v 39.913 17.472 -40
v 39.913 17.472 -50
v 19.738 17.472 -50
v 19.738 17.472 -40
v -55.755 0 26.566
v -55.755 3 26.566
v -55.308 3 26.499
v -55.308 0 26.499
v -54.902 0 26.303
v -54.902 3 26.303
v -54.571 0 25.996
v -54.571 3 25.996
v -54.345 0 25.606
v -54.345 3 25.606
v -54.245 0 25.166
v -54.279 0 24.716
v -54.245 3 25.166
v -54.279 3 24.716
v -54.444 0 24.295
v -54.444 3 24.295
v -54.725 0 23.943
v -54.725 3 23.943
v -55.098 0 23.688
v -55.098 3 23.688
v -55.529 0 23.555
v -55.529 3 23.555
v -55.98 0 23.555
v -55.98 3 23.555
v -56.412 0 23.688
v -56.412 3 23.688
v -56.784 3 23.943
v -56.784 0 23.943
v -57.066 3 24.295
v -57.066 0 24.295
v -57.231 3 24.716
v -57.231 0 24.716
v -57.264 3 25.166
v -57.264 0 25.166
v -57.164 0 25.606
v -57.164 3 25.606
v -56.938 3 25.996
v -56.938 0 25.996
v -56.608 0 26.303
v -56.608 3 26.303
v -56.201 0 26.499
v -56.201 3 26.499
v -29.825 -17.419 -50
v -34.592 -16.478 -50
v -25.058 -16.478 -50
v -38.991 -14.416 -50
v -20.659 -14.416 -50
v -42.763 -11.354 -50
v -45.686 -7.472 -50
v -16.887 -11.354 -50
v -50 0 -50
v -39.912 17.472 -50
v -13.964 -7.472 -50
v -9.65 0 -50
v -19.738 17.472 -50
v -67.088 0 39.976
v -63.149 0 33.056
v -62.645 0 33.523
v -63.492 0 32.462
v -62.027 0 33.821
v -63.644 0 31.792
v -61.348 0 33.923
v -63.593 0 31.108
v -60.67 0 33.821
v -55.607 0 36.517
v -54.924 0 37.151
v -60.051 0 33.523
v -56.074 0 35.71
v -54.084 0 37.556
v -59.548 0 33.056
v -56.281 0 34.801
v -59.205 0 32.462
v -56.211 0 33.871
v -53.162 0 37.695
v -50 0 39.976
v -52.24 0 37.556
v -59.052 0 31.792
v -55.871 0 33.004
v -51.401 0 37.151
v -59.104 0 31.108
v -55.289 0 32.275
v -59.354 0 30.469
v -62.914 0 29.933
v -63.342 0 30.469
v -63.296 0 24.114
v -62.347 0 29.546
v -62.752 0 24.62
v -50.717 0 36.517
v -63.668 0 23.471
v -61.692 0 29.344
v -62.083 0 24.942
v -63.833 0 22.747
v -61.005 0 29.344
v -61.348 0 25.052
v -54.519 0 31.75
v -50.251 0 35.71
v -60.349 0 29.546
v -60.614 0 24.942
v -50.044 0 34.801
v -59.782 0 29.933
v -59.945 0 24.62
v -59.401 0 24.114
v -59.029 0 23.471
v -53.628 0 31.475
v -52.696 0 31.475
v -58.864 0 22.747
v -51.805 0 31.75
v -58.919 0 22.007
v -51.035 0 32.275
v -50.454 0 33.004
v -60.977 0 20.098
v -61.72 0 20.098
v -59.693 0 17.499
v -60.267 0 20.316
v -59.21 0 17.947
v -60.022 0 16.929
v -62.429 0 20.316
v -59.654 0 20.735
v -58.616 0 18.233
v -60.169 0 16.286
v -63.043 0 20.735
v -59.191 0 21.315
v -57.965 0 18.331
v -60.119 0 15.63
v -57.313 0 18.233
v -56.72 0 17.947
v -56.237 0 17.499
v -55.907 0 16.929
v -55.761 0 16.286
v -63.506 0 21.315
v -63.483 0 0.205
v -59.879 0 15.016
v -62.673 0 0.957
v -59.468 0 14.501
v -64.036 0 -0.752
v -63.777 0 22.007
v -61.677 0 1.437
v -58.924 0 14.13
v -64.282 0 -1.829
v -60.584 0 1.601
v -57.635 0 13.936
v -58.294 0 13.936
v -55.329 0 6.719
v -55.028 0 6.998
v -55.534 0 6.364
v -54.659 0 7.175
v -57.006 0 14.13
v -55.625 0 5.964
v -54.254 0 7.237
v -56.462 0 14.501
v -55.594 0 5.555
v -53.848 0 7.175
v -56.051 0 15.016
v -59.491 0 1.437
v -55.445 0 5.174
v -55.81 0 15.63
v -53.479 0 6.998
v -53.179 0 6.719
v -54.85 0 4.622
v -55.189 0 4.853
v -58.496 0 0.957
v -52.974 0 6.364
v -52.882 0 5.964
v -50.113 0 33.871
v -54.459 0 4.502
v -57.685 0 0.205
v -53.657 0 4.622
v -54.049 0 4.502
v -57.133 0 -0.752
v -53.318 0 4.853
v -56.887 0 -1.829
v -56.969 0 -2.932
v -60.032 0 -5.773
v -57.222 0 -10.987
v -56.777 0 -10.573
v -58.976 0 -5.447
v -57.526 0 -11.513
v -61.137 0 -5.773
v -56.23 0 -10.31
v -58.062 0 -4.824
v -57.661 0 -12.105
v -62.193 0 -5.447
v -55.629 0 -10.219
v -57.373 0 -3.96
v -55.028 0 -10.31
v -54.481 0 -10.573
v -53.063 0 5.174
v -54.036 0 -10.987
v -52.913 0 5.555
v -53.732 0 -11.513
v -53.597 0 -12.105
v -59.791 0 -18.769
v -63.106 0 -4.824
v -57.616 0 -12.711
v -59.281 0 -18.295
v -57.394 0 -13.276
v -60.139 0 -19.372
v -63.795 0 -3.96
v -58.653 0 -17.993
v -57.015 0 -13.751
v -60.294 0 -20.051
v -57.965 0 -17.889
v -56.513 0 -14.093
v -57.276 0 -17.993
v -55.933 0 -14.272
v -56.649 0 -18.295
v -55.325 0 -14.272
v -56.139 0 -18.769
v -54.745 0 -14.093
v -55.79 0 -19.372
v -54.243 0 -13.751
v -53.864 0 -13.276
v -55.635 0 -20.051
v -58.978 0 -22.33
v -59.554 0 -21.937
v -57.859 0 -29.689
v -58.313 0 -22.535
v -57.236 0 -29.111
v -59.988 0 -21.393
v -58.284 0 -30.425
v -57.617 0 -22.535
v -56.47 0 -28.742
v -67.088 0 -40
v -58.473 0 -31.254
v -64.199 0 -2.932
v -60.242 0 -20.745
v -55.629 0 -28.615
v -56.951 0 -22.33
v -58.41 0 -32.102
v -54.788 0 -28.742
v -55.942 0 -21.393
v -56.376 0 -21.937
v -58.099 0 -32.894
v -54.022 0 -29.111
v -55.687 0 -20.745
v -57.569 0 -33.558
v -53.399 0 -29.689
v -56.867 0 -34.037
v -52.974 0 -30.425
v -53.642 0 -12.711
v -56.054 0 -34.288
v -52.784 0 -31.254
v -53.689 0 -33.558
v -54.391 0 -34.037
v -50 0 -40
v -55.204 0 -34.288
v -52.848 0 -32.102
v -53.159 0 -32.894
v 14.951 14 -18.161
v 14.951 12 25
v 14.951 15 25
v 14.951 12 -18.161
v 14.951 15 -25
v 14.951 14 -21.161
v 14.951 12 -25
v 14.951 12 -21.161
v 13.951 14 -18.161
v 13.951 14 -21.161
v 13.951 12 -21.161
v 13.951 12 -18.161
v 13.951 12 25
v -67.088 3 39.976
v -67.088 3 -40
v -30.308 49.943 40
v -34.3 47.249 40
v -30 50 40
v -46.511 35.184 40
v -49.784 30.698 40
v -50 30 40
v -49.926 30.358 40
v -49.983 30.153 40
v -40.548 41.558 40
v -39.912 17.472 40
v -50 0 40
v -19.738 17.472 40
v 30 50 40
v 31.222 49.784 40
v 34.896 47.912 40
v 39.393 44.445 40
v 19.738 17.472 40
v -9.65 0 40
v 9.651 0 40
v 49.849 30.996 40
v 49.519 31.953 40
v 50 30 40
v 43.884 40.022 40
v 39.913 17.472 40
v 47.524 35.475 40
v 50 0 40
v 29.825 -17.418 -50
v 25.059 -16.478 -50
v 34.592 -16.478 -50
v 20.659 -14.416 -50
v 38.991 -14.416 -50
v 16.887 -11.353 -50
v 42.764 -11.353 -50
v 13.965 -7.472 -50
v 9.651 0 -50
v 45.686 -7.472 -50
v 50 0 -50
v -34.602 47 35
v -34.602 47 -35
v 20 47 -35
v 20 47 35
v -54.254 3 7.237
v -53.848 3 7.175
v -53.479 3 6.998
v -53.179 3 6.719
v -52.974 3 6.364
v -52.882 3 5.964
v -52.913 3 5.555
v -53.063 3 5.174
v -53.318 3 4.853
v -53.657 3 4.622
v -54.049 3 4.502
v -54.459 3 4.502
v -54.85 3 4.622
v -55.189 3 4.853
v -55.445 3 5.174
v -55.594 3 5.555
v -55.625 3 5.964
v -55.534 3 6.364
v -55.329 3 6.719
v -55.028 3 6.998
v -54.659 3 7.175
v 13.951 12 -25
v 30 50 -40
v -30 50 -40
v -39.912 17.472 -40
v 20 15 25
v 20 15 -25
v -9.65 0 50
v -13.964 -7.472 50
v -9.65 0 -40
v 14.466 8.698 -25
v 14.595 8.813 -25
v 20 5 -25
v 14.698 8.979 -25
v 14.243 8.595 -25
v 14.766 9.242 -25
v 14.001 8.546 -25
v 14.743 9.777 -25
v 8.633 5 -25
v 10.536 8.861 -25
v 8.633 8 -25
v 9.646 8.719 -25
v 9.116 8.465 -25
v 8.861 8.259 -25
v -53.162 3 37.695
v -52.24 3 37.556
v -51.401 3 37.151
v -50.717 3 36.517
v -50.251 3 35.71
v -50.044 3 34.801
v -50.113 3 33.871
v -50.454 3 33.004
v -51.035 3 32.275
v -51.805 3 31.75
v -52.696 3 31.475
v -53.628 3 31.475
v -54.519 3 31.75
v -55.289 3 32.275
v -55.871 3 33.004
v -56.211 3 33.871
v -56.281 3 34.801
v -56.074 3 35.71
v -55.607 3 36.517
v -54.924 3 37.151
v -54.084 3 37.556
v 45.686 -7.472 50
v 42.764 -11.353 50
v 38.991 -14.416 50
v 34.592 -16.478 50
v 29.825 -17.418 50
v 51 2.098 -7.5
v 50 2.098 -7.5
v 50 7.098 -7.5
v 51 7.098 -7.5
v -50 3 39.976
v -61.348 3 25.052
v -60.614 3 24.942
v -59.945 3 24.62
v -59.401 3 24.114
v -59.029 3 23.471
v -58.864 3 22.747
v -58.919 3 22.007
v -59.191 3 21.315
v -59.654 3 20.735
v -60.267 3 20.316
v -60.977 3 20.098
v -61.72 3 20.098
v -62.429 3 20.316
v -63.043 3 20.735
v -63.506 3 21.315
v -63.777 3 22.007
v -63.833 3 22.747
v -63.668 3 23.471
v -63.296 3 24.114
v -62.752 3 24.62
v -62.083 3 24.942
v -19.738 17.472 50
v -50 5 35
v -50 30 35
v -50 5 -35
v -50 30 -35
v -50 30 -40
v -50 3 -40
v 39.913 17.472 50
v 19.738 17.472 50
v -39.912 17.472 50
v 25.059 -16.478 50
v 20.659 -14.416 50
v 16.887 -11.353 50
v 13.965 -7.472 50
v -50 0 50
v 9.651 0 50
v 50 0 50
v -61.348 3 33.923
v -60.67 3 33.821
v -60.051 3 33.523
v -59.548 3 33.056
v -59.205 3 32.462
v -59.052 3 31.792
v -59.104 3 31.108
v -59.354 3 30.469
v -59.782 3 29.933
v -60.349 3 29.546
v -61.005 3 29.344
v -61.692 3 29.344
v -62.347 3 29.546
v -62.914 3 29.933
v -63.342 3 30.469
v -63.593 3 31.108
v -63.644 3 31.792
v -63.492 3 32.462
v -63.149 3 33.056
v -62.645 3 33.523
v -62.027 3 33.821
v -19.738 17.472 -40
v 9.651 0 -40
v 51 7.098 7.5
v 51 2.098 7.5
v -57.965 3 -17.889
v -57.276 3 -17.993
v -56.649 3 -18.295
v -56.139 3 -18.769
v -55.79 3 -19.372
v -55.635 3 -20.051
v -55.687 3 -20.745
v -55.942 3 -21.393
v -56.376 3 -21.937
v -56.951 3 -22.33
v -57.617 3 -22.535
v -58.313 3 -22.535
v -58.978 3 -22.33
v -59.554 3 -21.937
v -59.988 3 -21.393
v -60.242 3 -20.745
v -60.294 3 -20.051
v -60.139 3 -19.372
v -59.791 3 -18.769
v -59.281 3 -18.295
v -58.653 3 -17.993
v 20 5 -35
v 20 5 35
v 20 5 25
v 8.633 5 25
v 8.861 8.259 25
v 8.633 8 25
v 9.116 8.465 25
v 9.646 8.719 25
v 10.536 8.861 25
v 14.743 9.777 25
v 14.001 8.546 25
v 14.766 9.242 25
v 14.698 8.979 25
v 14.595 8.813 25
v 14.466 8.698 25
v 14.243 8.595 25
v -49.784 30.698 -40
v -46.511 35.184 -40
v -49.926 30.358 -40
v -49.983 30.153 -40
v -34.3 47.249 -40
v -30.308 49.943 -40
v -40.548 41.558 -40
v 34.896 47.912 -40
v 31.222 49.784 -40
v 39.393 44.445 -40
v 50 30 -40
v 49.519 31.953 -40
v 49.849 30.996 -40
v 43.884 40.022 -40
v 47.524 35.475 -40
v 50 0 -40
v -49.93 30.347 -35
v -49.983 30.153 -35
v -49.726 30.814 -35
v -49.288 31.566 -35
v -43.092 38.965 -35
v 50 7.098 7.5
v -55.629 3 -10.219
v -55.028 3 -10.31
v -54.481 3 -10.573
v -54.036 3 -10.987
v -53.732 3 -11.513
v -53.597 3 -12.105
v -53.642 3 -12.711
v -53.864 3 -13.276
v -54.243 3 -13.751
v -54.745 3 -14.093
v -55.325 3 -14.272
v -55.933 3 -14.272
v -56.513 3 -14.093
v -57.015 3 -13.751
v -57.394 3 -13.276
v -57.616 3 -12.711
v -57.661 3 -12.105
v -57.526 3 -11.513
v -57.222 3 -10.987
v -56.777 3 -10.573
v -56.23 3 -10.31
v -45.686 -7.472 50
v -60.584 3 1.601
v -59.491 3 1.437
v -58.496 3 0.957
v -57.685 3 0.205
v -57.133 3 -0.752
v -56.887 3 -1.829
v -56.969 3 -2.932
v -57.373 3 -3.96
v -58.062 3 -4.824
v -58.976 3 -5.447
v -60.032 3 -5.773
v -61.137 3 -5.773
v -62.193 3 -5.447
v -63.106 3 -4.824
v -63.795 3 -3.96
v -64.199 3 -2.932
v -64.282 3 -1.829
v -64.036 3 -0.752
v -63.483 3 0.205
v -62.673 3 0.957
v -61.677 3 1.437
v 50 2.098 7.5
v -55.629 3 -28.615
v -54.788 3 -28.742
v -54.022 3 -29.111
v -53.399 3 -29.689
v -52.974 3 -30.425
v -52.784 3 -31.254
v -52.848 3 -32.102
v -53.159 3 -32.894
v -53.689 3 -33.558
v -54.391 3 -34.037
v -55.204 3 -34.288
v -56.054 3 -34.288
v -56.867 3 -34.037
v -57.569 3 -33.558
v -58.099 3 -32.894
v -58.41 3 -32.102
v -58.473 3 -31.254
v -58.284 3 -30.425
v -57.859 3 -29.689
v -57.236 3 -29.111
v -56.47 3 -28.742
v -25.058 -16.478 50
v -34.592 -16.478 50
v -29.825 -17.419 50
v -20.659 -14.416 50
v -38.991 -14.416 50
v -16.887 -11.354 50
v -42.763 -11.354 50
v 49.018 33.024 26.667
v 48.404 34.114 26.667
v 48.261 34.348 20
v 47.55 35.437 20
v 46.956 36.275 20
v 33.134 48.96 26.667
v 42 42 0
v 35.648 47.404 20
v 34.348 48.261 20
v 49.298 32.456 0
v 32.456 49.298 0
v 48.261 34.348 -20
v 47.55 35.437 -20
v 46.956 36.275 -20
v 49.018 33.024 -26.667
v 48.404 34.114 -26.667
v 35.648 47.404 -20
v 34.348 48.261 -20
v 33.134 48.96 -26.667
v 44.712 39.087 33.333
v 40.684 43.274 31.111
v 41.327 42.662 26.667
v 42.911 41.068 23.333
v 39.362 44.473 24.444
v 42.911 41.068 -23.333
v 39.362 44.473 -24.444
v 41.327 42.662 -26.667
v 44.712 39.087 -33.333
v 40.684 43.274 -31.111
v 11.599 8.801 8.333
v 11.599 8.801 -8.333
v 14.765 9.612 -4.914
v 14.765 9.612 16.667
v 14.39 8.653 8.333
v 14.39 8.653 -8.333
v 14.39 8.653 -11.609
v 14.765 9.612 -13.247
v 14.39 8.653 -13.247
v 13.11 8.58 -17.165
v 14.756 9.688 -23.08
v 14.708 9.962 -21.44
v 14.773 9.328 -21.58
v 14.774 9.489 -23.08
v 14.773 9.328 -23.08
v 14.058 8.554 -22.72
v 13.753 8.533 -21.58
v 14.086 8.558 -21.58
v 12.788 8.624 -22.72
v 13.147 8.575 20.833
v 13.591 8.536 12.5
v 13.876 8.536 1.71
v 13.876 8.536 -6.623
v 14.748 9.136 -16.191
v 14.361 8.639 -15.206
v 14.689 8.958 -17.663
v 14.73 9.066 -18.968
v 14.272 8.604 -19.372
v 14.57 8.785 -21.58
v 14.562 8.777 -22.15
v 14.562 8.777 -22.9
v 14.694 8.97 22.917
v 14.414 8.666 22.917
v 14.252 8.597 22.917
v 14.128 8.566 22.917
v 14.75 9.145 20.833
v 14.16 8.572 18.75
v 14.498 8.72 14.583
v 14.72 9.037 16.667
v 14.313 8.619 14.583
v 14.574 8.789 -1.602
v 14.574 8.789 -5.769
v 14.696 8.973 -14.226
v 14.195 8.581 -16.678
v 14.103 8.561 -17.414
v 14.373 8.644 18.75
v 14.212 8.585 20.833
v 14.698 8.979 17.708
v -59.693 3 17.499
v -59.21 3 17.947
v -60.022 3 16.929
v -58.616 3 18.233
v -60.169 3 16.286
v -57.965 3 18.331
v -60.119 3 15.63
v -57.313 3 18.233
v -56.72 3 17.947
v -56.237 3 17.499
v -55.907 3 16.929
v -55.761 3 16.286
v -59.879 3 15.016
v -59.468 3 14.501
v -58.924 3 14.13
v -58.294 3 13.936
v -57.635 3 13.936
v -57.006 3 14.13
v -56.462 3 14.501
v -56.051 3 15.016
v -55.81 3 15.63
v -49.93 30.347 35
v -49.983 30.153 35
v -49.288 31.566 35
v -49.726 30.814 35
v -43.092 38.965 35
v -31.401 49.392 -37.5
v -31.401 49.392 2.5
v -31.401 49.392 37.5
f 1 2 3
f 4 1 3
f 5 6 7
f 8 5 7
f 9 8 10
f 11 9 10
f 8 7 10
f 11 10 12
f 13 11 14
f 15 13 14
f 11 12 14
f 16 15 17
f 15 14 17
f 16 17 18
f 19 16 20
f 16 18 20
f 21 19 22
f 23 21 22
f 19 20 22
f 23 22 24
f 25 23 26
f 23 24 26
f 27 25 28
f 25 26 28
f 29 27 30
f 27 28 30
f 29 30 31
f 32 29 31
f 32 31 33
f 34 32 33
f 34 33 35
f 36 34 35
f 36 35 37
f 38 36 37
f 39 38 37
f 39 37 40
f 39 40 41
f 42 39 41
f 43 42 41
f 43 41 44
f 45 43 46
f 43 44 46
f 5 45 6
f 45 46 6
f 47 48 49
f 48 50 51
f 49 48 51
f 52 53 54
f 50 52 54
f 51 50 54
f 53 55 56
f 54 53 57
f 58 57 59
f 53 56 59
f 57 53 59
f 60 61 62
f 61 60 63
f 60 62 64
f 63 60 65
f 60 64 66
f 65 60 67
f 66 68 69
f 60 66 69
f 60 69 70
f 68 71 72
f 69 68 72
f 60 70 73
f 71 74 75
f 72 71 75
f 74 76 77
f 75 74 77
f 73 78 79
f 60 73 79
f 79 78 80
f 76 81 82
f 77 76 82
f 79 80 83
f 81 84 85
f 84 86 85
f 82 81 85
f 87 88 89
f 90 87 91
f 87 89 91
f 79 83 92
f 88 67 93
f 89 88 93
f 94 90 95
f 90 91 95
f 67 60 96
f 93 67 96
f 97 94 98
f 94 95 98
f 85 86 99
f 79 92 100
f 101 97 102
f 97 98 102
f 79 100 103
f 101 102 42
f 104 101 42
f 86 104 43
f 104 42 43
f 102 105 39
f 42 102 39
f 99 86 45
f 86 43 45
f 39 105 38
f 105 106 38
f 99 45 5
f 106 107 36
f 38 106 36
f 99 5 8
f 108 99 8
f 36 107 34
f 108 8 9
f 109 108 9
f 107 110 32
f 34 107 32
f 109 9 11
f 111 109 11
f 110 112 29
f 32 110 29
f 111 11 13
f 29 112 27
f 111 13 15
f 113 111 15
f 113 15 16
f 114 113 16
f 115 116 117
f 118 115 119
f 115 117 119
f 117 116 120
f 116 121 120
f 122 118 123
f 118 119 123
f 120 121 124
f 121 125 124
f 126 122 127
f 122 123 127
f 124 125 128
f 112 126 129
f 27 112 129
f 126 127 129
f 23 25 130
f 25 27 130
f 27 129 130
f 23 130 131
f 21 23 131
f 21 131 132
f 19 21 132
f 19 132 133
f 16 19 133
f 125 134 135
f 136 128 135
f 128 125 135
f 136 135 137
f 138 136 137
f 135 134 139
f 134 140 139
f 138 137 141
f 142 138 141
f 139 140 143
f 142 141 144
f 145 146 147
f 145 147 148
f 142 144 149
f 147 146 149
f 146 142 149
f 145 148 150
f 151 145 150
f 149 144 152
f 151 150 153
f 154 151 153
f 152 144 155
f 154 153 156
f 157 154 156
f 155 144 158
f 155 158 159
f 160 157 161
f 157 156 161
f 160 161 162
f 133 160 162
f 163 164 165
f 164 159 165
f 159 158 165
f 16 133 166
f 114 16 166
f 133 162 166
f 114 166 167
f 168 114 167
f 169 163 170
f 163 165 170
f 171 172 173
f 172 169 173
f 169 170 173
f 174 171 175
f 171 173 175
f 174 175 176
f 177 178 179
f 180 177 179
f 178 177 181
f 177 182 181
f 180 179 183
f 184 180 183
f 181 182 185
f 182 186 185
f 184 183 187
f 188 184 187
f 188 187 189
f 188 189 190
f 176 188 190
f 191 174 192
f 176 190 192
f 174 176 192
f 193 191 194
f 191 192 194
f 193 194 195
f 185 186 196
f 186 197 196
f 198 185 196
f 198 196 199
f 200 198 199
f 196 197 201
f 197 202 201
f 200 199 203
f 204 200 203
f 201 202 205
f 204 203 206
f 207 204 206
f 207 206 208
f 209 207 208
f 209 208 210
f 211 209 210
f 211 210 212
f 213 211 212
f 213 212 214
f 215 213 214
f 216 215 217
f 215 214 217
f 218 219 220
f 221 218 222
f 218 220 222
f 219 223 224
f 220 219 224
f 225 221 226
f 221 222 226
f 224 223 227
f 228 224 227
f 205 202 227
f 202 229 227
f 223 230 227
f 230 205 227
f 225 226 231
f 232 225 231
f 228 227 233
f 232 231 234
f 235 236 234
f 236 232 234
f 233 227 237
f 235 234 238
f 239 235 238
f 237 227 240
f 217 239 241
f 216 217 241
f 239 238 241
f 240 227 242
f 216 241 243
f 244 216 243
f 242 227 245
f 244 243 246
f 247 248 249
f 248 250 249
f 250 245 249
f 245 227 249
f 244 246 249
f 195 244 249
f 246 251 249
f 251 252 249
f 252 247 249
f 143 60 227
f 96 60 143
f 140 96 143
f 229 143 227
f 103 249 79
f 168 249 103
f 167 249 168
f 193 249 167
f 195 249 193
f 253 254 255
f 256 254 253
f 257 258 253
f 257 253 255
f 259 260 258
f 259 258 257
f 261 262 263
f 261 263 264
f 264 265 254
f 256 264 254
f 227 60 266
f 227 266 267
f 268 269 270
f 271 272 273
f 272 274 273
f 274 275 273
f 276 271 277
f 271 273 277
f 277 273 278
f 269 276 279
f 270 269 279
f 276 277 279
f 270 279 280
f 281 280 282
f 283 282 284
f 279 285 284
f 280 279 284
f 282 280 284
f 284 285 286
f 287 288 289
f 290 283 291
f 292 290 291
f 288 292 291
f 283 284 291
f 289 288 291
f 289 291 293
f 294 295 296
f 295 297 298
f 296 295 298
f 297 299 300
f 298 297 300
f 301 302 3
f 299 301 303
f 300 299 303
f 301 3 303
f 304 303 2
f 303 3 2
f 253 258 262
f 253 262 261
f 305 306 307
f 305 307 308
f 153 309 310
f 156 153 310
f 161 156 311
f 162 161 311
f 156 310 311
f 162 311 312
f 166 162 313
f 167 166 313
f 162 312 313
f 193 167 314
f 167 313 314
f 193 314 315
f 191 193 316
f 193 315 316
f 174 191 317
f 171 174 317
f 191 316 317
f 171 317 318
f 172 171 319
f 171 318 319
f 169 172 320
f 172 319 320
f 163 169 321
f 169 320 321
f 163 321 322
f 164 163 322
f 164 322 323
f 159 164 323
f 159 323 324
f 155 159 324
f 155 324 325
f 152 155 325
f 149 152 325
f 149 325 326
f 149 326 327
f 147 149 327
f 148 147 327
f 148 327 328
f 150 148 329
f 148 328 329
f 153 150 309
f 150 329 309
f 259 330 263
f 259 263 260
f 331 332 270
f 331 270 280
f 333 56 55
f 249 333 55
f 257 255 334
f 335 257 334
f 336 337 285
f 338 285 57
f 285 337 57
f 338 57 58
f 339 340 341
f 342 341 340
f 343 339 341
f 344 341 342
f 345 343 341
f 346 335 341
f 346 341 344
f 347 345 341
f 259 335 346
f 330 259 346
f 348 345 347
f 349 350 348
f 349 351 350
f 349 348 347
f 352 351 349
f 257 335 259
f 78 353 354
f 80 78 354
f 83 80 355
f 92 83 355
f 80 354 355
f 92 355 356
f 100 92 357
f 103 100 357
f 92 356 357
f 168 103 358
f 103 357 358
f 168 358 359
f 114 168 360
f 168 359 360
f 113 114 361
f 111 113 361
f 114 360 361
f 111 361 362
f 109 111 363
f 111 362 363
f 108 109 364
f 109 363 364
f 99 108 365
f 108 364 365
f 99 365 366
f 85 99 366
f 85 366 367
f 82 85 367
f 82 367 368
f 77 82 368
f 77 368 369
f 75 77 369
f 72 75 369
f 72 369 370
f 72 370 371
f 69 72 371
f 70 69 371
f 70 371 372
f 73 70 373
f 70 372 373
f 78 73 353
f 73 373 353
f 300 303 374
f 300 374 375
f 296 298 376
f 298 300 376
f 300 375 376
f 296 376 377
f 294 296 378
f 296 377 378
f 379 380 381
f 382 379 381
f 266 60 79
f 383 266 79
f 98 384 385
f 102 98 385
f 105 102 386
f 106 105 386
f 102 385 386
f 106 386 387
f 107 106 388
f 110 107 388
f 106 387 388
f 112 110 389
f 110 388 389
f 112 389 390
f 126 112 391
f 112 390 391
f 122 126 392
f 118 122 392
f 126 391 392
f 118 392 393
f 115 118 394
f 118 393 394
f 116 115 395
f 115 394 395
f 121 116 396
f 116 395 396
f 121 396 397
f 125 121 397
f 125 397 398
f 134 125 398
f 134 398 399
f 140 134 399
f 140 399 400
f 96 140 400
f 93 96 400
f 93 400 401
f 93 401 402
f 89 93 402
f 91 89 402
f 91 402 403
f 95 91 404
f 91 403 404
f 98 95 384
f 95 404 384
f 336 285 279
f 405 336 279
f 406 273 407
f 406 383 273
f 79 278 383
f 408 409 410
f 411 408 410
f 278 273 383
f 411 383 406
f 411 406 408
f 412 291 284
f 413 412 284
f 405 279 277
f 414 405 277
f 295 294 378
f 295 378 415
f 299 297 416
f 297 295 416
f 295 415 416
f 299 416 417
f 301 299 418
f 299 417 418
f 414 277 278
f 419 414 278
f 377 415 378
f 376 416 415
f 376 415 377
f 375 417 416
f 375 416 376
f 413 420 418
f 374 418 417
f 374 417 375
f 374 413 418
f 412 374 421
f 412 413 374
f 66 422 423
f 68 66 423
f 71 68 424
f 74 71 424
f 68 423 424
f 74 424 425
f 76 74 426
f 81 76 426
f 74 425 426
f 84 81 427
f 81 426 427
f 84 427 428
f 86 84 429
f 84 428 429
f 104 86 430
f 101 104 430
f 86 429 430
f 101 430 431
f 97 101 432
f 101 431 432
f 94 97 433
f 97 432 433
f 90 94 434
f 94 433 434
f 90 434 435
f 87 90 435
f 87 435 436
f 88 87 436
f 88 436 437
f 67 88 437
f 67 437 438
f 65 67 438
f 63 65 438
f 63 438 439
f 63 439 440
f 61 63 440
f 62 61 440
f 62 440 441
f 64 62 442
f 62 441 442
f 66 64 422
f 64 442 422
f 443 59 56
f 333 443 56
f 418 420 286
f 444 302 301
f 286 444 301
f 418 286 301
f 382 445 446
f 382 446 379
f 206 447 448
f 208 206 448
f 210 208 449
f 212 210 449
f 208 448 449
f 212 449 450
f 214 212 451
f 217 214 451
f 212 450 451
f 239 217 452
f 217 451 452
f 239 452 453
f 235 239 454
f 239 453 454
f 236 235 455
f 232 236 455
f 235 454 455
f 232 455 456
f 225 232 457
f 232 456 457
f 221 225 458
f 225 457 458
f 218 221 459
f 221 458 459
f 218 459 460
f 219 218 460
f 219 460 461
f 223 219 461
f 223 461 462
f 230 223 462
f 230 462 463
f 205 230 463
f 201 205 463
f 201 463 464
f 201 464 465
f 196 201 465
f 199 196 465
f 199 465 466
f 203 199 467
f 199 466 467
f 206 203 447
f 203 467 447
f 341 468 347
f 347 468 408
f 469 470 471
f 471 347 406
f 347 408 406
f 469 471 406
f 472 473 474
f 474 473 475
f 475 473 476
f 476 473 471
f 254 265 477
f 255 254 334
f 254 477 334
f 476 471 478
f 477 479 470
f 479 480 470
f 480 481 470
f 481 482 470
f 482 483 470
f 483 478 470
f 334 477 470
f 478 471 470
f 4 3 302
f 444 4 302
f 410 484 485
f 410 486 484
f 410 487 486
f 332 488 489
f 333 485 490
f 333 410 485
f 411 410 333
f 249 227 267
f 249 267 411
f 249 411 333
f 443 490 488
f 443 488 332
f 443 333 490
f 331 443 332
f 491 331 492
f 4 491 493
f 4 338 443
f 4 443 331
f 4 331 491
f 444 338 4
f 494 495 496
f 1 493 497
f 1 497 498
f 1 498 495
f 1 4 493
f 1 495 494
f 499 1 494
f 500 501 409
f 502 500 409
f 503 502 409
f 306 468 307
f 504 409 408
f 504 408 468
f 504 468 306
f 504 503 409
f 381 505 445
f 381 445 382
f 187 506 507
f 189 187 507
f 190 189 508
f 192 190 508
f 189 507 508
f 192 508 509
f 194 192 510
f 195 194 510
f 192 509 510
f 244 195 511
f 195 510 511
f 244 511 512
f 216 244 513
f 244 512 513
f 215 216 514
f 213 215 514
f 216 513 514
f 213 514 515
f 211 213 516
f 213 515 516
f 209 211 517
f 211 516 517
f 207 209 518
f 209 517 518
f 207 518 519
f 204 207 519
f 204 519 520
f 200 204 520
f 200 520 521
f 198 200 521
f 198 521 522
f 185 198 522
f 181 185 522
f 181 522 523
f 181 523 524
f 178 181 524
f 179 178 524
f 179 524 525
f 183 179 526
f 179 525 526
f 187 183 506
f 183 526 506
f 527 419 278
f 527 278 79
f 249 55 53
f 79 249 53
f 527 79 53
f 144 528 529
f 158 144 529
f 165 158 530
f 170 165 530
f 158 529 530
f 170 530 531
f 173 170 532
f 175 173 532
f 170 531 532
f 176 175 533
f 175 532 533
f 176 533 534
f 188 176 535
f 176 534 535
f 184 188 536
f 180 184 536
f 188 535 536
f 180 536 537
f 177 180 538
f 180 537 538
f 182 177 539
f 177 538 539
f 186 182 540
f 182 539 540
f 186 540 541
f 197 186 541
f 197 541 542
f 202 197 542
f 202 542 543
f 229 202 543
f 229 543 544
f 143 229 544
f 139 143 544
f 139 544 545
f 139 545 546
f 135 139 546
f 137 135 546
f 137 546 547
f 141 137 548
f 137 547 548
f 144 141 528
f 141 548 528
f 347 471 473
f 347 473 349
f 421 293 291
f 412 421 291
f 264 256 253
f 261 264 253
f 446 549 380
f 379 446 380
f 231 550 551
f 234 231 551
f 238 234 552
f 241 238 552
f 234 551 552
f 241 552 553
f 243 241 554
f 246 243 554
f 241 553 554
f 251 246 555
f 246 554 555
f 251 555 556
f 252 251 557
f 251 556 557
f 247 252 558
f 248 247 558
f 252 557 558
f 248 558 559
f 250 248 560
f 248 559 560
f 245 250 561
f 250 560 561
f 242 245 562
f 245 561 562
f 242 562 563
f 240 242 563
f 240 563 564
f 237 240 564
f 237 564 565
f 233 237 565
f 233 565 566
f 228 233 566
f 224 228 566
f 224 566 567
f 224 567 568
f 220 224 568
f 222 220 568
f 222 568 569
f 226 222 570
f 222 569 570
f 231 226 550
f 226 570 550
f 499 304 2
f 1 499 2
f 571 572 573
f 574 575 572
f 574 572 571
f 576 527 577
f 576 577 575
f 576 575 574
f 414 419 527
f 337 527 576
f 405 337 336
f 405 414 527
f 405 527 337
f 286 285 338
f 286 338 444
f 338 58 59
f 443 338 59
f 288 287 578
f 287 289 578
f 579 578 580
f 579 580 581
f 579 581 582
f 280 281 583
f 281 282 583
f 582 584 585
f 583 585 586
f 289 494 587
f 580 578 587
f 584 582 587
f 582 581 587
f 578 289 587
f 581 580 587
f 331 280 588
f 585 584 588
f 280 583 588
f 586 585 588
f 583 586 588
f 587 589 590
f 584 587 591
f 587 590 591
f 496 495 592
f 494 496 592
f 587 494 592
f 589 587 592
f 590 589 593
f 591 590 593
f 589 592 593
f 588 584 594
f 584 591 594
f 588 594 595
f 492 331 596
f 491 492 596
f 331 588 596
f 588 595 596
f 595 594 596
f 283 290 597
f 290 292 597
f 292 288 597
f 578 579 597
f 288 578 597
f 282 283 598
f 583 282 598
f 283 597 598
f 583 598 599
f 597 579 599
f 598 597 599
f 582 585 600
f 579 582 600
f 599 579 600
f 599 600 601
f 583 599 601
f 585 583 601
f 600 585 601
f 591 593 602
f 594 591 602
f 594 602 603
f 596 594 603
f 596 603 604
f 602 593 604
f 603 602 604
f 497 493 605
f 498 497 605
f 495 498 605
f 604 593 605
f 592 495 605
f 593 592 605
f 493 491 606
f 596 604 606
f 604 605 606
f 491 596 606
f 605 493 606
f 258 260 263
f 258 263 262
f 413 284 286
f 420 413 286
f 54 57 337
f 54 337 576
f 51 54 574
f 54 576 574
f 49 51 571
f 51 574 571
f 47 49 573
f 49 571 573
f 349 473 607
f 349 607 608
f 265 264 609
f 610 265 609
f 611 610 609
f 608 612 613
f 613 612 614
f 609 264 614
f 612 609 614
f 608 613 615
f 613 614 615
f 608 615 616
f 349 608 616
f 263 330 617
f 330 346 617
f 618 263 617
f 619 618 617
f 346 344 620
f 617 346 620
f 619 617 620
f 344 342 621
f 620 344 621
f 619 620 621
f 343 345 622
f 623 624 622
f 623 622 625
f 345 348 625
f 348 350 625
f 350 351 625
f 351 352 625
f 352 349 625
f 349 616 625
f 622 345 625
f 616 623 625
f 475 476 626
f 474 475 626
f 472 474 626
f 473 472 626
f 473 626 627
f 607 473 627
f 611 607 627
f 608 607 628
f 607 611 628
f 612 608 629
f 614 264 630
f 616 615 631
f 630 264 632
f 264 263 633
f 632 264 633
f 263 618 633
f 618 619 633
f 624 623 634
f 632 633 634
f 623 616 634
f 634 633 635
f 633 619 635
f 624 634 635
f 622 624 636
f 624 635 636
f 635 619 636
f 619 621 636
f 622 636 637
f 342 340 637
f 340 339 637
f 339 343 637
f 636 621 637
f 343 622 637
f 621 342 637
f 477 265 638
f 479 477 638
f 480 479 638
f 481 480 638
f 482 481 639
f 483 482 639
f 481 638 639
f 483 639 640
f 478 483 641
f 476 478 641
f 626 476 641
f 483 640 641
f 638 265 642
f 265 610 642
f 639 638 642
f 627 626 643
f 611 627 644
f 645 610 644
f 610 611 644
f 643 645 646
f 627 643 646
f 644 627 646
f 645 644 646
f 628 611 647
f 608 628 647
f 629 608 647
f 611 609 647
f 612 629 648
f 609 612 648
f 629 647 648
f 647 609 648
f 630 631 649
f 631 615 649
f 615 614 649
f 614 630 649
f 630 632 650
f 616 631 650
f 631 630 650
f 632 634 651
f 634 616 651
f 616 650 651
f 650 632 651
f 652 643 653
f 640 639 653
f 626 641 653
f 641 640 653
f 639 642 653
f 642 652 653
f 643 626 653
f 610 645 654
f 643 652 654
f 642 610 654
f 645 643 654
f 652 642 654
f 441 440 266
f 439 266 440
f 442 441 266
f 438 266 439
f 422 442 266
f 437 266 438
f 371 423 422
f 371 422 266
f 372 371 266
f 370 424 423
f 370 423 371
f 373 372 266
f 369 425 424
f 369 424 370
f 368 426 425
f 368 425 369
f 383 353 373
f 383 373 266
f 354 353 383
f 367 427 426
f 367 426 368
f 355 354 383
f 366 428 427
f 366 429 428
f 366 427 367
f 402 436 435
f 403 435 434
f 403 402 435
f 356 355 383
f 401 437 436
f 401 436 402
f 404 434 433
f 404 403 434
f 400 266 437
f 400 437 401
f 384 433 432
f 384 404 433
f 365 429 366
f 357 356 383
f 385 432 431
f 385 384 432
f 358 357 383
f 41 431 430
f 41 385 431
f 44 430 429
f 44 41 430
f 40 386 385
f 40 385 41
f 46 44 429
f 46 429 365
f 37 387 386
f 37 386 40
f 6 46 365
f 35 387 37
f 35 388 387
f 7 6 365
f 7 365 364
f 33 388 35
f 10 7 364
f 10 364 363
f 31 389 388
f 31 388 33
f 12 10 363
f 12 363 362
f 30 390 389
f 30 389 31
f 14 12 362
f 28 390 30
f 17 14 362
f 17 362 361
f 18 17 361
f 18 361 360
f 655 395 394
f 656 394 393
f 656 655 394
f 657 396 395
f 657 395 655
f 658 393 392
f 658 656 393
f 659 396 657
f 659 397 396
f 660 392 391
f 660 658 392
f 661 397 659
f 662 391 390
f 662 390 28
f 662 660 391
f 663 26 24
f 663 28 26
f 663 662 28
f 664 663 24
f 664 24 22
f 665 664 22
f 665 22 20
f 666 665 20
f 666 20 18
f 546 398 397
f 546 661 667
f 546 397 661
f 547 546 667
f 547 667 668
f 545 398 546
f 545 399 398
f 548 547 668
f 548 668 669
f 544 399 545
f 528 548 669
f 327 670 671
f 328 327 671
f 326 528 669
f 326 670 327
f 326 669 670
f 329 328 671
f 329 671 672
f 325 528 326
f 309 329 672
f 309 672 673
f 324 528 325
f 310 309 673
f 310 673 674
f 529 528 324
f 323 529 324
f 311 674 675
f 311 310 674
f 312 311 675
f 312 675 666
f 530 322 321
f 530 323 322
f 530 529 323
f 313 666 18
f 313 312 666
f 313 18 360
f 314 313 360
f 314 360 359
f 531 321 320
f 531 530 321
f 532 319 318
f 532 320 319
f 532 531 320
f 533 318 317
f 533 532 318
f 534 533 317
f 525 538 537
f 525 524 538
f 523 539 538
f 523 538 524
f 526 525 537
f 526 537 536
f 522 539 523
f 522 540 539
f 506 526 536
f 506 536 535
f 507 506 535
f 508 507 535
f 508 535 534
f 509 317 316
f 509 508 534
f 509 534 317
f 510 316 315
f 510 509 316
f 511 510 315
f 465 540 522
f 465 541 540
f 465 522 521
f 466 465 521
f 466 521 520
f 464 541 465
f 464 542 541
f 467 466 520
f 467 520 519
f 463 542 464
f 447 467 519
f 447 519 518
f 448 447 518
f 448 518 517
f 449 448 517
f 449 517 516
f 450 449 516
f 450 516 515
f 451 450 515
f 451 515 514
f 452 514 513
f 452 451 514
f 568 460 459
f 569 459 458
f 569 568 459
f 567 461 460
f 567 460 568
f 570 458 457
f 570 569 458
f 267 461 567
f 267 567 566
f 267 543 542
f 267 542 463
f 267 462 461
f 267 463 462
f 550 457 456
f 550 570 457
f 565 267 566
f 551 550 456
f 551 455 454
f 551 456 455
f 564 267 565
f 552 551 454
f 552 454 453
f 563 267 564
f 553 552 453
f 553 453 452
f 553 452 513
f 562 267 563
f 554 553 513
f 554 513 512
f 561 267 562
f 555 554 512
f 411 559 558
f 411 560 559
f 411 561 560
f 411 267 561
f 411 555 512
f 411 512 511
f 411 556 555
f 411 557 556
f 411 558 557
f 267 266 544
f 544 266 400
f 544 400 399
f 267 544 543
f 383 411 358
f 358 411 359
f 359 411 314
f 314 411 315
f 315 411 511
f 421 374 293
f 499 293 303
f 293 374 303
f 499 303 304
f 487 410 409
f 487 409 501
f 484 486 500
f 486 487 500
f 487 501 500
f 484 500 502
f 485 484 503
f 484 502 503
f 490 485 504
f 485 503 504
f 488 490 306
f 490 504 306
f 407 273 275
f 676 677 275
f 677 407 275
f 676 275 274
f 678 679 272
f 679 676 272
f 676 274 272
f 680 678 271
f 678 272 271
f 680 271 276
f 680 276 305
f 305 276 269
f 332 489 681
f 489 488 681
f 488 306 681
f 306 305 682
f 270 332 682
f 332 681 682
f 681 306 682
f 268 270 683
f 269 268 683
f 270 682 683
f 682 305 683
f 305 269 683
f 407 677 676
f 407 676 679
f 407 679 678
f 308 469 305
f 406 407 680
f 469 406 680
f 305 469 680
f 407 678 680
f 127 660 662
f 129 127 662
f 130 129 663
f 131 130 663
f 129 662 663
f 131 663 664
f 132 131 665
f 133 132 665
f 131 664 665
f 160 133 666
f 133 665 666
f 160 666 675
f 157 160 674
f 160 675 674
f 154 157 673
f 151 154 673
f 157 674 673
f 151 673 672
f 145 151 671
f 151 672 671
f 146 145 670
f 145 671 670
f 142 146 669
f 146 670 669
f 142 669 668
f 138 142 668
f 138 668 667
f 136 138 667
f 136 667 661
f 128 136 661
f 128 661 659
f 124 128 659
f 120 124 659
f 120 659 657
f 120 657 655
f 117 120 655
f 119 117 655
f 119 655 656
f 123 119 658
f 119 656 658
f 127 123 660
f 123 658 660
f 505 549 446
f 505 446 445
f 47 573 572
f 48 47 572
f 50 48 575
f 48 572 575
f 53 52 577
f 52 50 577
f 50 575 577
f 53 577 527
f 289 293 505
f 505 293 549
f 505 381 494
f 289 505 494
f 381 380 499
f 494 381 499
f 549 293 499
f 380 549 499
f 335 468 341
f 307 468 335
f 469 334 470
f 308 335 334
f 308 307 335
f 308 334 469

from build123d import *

# Parameters (mm, degrees)
SKETCH_1_W           = 100
SKETCH_1_H           = 80
EXTRUDE_1_DEPTH      = 50
EXTRUDE_3_DEPTH      = 10
EXTRUDE_3_DEPTH_BACK = 90
FILLET_1_SIZE        = 20
FILLET_2_R           = 20
SKETCH_7_W           = 15
SKETCH_7_H           = 5
EXTRUDE_4_DEPTH      = 1
EXTRUDE_5_DEPTH      = 10
EXTRUDE_5_DEPTH_BACK = 90
SKETCH_9_W           = 70
SKETCH_9_H           = 42
CUT_EXTRUDE_1_DEPTH  = 70
SKETCH_10_W          = 6.318012245
SKETCH_10_H          = 50
EXTRUDE_6_DEPTH      = 3
SKETCH_11_W          = 5.049227312
SKETCH_11_H          = 50
EXTRUDE_7_DEPTH      = 10
SKETCH_12_W          = 3
SKETCH_12_H          = 2
EXTRUDE_8_DEPTH      = 1
SKETCH_14_W          = 17.088208375
SKETCH_14_H          = 79.975552451
EXTRUDE_9_DEPTH      = 3
SKETCH_15_R          = 3.127439505
SKETCH_15_R_2        = 2.491358357
SKETCH_15_R_3        = 2.210086479
SKETCH_15_R_4        = 1.513903484
SKETCH_15_R_5        = 2.302487837
SKETCH_15_R_6        = 3.707833668
SKETCH_15_R_7        = 2.33587758
SKETCH_15_R_8        = 2.037847665
SKETCH_15_R_9        = 1.375167725
SKETCH_15_R_10       = 2.852513386
CUT_EXTRUDE_2_DEPTH  = 3
FILLET_7_SIZE        = 20
FILLET_8_R           = 20
EXTRUDE_10_DEPTH     = 50


with BuildPart() as part:
    # 草圖1 → 填料-伸長1 (new body)
    with BuildSketch(Plane(origin=(0, 0, 0), x_dir=(1, 0, 0), z_dir=(0, 1, 0))):
        Rectangle(SKETCH_1_W, SKETCH_1_H)
    extrude(amount=EXTRUDE_1_DEPTH)

    # 草圖4 → 填料-伸長3 (add, two sides: drawn at the far end of the back side and taken through both)
    with BuildSketch(Plane.XY.offset(40).offset(-EXTRUDE_3_DEPTH_BACK)):
        Polygon((50, 0), (39.912672295, 17.471764098), (19.738016884, 17.471764098), (9.650689179, 0), (19.738016884, -17.471764098), (39.912672295, -17.471764098), align=None)
    extrude(amount=EXTRUDE_3_DEPTH + EXTRUDE_3_DEPTH_BACK)

    # 圓角1
    # a fillet whose section is not a circle: 20 mm, written as the material it takes off along each edge
    with BuildSketch(Plane(origin=(50, 50, -90), x_dir=(0, -1, 0), z_dir=(0, 0, 1))) as fillet_1_piece_1:
        with BuildLine():
            Bezier((FILLET_1_SIZE, 0), (0, 0), (0, -FILLET_1_SIZE), weights=[1, 0.25, 1])
            Line((0, -FILLET_1_SIZE), (0, 0))
            Line((0, 0), (FILLET_1_SIZE, 0))
        make_face()
    extrude(amount=180, mode=Mode.SUBTRACT)

    # 圓角2
    # the kernel refuses this fillet: 20 mm, written as the material it takes off along each edge
    with BuildSketch(Plane(origin=(39.912672295, -17.471764098, 78.867513459), x_dir=(0.499999999999995, 0.8660254037844415, 0), z_dir=(0, 0, -1))) as fillet_2_piece_1:
        with BuildLine():
            CenterArc((FILLET_2_R * 0.57735026919, -FILLET_2_R), FILLET_2_R, 90, 60)
            Line((-FILLET_2_R * 0.288675134595, -FILLET_2_R * 0.5), (0, 0))
            Line((0, 0), (FILLET_2_R * 0.57735026919, 0))
        make_face()
    extrude(amount=157.735026919, mode=Mode.SUBTRACT)
    with BuildSketch(Plane(origin=(19.738016884, -17.471764098, 78.867513459), x_dir=(-0.5000000000000067, 0.8660254037844347, 0), z_dir=(0, 0, -1))) as fillet_2_piece_2:
        with BuildLine():
            CenterArc((FILLET_2_R * 0.57735026919, FILLET_2_R), FILLET_2_R, 210, 60)
            Line((-FILLET_2_R * 0.288675134595, FILLET_2_R * 0.5), (0, 0))
            Line((0, 0), (FILLET_2_R * 0.57735026919, 0))
        make_face()
    extrude(amount=157.735026919, mode=Mode.SUBTRACT)

    # 草圖7 → 填料-伸長4 (add)
    with BuildSketch(Plane(origin=(50, 0, 0), x_dir=(0, 0, -1), z_dir=(1, 0, 0))):
        with Locations((0, 4.59808643)):
            Rectangle(SKETCH_7_W, SKETCH_7_H)
    extrude(amount=EXTRUDE_4_DEPTH)

    # 草圖8 → 填料-伸長5 (add, two sides: drawn at the far end of the back side and taken through both)
    with BuildSketch(Plane.XY.offset(40).offset(-EXTRUDE_5_DEPTH_BACK)):
        Polygon((-9.65, 0), (-19.7375, 17.472062521), (-39.9125, 17.472062521), (-50, 0), (-39.9125, -17.472062521), (-19.7375, -17.472062521), align=None)
    extrude(amount=EXTRUDE_5_DEPTH + EXTRUDE_5_DEPTH_BACK)

    # 草圖9 → 除料-伸長1 (cut)
    with BuildSketch(Plane.ZY.offset(50)):
        with Locations((0, 26)):
            Rectangle(SKETCH_9_W, SKETCH_9_H)
    extrude(amount=-CUT_EXTRUDE_1_DEPTH, mode=Mode.SUBTRACT)

    # 草圖10 → 填料-伸長6 (add)
    with BuildSketch(Plane(origin=(0, 5, 0), x_dir=(1, 0, 0), z_dir=(0, 1, 0))):
        with Locations((11.791766566, 0)):
            Rectangle(SKETCH_10_W, SKETCH_10_H)
    extrude(amount=EXTRUDE_6_DEPTH)

    # 草圖11 → 填料-伸長7 (add)
    with BuildSketch(Plane(origin=(0, 5, 0), x_dir=(1, 0, 0), z_dir=(0, 1, 0))):
        with Locations((17.475386344, 0)):
            Rectangle(SKETCH_11_W, SKETCH_11_H)
    extrude(amount=EXTRUDE_7_DEPTH)

    # 草圖12 → 填料-伸長8 (add)
    with BuildSketch(Plane.ZY.offset(-14.950772688)):
        with Locations((-19.660528626, 13)):
            Rectangle(SKETCH_12_W, SKETCH_12_H)
    extrude(amount=EXTRUDE_8_DEPTH)

    # 草圖14 → 填料-伸長9 (add)
    with BuildSketch(Plane(origin=(0, 0, 0), x_dir=(1, 0, 0), z_dir=(0, 1, 0))):
        with Locations((-58.544104188, 0.012223774)):
            Rectangle(SKETCH_14_W, SKETCH_14_H)
    extrude(amount=EXTRUDE_9_DEPTH)

    # 草圖15 → 除料-伸長2 (cut)
    with BuildSketch(Plane(origin=(0, 3, 0), x_dir=(1, 0, 0), z_dir=(0, 1, 0))):
        with Locations(Location((-53.162249787, -34.567412257, 0), (0, 0, 270))):
            Circle(SKETCH_15_R)
        with Locations(Location((-61.348379135, -22.561089213, 0), (0, 0, 270))):
            Circle(SKETCH_15_R_2)
        with Locations(Location((-57.964779004, -16.121334126, 0), (0, 0, 270))):
            Circle(SKETCH_15_R_3)
        with Locations(Location((-55.754692526, -25.052447569, 0), (0, 0, 270))):
            Circle(SKETCH_15_R_4)
        with Locations(Location((-61.348379135, -31.620405692, 0), (0, 0, 270))):
            Circle(SKETCH_15_R_5)
        with Locations(Location((-60.584340396, 2.106447223, 0), (0, 0, 270))):
            Circle(SKETCH_15_R_6)
        with Locations(Location((-57.964779004, 20.225080181, 0), (0, 0, 270))):
            Circle(SKETCH_15_R_7)
        with Locations(Location((-55.628901425, 12.257247615, 0), (0, 0, 270))):
            Circle(SKETCH_15_R_8)
        with Locations(Location((-54.2537337, -5.861385342, 0), (0, 0, 270))):
            Circle(SKETCH_15_R_9)
        with Locations(Location((-55.628901425, 31.467364486, 0), (0, 0, 270))):
            Circle(SKETCH_15_R_10)
    extrude(amount=-CUT_EXTRUDE_2_DEPTH, mode=Mode.SUBTRACT)

    # 圓角7
    # a fillet whose section is not a circle: 20 mm, written as the material it takes off along each edge
    with BuildSketch(Plane(origin=(-50, 50, 90), x_dir=(0, -1, 0), z_dir=(0, 0, -1))) as fillet_7_piece_1:
        with BuildLine():
            Bezier((FILLET_7_SIZE, 0), (0, 0), (0, -FILLET_7_SIZE), weights=[1, 0.11785113, 1])
            Line((0, -FILLET_7_SIZE), (0, 0))
            Line((0, 0), (FILLET_7_SIZE, 0))
        make_face()
    extrude(amount=180, mode=Mode.SUBTRACT)

    # 圓角8
    # the kernel refuses this fillet: 20 mm, written as the material it takes off along each edge
    with BuildSketch(Plane(origin=(-19.7375, -17.472062521, 78.867513459), x_dir=(0.4999999999999952, 0.8660254037844414, 0), z_dir=(0, 0, -1))) as fillet_8_piece_1:
        with BuildLine():
            CenterArc((FILLET_8_R * 0.57735026919, -FILLET_8_R), FILLET_8_R, 90, 60)
            Line((-FILLET_8_R * 0.288675134595, -FILLET_8_R * 0.5), (0, 0))
            Line((0, 0), (FILLET_8_R * 0.57735026919, 0))
        make_face()
    extrude(amount=157.735026919, mode=Mode.SUBTRACT)
    with BuildSketch(Plane(origin=(-39.9125, -17.472062521, 78.867513459), x_dir=(-0.5000000000000036, 0.8660254037844366, 0), z_dir=(0, 0, -1))) as fillet_8_piece_2:
        with BuildLine():
            CenterArc((FILLET_8_R * 0.57735026919, FILLET_8_R), FILLET_8_R, 210, 60)
            Line((-FILLET_8_R * 0.288675134595, FILLET_8_R * 0.5), (0, 0))
            Line((0, 0), (FILLET_8_R * 0.57735026919, 0))
        make_face()
    extrude(amount=157.735026919, mode=Mode.SUBTRACT)

    # 草圖18 → 填料-伸長10 (add)
    with BuildSketch(Plane(origin=(0, 0, -25), x_dir=(-1, 0, 0), z_dir=(0, 0, -1))):
        with BuildLine():
            Line((-13.950772688, 12), (-14.950772688, 12))
            Line((-14.950772688, 12), (-14.950772688, 8))
            Line((-14.950772688, 8), (-8.632760443, 8))
            add(Edge.make_bspline(
                [(-13.950772688, 12), (-17.022847393, 5.423952997), (-10.668970585, 10.756901706), (-8.632760443, 8)],
                knots=[0, 0, 0, 0, 1, 1, 1, 1], degree=3))
        make_face()
    extrude(amount=-EXTRUDE_10_DEPTH)


solid = part.part
